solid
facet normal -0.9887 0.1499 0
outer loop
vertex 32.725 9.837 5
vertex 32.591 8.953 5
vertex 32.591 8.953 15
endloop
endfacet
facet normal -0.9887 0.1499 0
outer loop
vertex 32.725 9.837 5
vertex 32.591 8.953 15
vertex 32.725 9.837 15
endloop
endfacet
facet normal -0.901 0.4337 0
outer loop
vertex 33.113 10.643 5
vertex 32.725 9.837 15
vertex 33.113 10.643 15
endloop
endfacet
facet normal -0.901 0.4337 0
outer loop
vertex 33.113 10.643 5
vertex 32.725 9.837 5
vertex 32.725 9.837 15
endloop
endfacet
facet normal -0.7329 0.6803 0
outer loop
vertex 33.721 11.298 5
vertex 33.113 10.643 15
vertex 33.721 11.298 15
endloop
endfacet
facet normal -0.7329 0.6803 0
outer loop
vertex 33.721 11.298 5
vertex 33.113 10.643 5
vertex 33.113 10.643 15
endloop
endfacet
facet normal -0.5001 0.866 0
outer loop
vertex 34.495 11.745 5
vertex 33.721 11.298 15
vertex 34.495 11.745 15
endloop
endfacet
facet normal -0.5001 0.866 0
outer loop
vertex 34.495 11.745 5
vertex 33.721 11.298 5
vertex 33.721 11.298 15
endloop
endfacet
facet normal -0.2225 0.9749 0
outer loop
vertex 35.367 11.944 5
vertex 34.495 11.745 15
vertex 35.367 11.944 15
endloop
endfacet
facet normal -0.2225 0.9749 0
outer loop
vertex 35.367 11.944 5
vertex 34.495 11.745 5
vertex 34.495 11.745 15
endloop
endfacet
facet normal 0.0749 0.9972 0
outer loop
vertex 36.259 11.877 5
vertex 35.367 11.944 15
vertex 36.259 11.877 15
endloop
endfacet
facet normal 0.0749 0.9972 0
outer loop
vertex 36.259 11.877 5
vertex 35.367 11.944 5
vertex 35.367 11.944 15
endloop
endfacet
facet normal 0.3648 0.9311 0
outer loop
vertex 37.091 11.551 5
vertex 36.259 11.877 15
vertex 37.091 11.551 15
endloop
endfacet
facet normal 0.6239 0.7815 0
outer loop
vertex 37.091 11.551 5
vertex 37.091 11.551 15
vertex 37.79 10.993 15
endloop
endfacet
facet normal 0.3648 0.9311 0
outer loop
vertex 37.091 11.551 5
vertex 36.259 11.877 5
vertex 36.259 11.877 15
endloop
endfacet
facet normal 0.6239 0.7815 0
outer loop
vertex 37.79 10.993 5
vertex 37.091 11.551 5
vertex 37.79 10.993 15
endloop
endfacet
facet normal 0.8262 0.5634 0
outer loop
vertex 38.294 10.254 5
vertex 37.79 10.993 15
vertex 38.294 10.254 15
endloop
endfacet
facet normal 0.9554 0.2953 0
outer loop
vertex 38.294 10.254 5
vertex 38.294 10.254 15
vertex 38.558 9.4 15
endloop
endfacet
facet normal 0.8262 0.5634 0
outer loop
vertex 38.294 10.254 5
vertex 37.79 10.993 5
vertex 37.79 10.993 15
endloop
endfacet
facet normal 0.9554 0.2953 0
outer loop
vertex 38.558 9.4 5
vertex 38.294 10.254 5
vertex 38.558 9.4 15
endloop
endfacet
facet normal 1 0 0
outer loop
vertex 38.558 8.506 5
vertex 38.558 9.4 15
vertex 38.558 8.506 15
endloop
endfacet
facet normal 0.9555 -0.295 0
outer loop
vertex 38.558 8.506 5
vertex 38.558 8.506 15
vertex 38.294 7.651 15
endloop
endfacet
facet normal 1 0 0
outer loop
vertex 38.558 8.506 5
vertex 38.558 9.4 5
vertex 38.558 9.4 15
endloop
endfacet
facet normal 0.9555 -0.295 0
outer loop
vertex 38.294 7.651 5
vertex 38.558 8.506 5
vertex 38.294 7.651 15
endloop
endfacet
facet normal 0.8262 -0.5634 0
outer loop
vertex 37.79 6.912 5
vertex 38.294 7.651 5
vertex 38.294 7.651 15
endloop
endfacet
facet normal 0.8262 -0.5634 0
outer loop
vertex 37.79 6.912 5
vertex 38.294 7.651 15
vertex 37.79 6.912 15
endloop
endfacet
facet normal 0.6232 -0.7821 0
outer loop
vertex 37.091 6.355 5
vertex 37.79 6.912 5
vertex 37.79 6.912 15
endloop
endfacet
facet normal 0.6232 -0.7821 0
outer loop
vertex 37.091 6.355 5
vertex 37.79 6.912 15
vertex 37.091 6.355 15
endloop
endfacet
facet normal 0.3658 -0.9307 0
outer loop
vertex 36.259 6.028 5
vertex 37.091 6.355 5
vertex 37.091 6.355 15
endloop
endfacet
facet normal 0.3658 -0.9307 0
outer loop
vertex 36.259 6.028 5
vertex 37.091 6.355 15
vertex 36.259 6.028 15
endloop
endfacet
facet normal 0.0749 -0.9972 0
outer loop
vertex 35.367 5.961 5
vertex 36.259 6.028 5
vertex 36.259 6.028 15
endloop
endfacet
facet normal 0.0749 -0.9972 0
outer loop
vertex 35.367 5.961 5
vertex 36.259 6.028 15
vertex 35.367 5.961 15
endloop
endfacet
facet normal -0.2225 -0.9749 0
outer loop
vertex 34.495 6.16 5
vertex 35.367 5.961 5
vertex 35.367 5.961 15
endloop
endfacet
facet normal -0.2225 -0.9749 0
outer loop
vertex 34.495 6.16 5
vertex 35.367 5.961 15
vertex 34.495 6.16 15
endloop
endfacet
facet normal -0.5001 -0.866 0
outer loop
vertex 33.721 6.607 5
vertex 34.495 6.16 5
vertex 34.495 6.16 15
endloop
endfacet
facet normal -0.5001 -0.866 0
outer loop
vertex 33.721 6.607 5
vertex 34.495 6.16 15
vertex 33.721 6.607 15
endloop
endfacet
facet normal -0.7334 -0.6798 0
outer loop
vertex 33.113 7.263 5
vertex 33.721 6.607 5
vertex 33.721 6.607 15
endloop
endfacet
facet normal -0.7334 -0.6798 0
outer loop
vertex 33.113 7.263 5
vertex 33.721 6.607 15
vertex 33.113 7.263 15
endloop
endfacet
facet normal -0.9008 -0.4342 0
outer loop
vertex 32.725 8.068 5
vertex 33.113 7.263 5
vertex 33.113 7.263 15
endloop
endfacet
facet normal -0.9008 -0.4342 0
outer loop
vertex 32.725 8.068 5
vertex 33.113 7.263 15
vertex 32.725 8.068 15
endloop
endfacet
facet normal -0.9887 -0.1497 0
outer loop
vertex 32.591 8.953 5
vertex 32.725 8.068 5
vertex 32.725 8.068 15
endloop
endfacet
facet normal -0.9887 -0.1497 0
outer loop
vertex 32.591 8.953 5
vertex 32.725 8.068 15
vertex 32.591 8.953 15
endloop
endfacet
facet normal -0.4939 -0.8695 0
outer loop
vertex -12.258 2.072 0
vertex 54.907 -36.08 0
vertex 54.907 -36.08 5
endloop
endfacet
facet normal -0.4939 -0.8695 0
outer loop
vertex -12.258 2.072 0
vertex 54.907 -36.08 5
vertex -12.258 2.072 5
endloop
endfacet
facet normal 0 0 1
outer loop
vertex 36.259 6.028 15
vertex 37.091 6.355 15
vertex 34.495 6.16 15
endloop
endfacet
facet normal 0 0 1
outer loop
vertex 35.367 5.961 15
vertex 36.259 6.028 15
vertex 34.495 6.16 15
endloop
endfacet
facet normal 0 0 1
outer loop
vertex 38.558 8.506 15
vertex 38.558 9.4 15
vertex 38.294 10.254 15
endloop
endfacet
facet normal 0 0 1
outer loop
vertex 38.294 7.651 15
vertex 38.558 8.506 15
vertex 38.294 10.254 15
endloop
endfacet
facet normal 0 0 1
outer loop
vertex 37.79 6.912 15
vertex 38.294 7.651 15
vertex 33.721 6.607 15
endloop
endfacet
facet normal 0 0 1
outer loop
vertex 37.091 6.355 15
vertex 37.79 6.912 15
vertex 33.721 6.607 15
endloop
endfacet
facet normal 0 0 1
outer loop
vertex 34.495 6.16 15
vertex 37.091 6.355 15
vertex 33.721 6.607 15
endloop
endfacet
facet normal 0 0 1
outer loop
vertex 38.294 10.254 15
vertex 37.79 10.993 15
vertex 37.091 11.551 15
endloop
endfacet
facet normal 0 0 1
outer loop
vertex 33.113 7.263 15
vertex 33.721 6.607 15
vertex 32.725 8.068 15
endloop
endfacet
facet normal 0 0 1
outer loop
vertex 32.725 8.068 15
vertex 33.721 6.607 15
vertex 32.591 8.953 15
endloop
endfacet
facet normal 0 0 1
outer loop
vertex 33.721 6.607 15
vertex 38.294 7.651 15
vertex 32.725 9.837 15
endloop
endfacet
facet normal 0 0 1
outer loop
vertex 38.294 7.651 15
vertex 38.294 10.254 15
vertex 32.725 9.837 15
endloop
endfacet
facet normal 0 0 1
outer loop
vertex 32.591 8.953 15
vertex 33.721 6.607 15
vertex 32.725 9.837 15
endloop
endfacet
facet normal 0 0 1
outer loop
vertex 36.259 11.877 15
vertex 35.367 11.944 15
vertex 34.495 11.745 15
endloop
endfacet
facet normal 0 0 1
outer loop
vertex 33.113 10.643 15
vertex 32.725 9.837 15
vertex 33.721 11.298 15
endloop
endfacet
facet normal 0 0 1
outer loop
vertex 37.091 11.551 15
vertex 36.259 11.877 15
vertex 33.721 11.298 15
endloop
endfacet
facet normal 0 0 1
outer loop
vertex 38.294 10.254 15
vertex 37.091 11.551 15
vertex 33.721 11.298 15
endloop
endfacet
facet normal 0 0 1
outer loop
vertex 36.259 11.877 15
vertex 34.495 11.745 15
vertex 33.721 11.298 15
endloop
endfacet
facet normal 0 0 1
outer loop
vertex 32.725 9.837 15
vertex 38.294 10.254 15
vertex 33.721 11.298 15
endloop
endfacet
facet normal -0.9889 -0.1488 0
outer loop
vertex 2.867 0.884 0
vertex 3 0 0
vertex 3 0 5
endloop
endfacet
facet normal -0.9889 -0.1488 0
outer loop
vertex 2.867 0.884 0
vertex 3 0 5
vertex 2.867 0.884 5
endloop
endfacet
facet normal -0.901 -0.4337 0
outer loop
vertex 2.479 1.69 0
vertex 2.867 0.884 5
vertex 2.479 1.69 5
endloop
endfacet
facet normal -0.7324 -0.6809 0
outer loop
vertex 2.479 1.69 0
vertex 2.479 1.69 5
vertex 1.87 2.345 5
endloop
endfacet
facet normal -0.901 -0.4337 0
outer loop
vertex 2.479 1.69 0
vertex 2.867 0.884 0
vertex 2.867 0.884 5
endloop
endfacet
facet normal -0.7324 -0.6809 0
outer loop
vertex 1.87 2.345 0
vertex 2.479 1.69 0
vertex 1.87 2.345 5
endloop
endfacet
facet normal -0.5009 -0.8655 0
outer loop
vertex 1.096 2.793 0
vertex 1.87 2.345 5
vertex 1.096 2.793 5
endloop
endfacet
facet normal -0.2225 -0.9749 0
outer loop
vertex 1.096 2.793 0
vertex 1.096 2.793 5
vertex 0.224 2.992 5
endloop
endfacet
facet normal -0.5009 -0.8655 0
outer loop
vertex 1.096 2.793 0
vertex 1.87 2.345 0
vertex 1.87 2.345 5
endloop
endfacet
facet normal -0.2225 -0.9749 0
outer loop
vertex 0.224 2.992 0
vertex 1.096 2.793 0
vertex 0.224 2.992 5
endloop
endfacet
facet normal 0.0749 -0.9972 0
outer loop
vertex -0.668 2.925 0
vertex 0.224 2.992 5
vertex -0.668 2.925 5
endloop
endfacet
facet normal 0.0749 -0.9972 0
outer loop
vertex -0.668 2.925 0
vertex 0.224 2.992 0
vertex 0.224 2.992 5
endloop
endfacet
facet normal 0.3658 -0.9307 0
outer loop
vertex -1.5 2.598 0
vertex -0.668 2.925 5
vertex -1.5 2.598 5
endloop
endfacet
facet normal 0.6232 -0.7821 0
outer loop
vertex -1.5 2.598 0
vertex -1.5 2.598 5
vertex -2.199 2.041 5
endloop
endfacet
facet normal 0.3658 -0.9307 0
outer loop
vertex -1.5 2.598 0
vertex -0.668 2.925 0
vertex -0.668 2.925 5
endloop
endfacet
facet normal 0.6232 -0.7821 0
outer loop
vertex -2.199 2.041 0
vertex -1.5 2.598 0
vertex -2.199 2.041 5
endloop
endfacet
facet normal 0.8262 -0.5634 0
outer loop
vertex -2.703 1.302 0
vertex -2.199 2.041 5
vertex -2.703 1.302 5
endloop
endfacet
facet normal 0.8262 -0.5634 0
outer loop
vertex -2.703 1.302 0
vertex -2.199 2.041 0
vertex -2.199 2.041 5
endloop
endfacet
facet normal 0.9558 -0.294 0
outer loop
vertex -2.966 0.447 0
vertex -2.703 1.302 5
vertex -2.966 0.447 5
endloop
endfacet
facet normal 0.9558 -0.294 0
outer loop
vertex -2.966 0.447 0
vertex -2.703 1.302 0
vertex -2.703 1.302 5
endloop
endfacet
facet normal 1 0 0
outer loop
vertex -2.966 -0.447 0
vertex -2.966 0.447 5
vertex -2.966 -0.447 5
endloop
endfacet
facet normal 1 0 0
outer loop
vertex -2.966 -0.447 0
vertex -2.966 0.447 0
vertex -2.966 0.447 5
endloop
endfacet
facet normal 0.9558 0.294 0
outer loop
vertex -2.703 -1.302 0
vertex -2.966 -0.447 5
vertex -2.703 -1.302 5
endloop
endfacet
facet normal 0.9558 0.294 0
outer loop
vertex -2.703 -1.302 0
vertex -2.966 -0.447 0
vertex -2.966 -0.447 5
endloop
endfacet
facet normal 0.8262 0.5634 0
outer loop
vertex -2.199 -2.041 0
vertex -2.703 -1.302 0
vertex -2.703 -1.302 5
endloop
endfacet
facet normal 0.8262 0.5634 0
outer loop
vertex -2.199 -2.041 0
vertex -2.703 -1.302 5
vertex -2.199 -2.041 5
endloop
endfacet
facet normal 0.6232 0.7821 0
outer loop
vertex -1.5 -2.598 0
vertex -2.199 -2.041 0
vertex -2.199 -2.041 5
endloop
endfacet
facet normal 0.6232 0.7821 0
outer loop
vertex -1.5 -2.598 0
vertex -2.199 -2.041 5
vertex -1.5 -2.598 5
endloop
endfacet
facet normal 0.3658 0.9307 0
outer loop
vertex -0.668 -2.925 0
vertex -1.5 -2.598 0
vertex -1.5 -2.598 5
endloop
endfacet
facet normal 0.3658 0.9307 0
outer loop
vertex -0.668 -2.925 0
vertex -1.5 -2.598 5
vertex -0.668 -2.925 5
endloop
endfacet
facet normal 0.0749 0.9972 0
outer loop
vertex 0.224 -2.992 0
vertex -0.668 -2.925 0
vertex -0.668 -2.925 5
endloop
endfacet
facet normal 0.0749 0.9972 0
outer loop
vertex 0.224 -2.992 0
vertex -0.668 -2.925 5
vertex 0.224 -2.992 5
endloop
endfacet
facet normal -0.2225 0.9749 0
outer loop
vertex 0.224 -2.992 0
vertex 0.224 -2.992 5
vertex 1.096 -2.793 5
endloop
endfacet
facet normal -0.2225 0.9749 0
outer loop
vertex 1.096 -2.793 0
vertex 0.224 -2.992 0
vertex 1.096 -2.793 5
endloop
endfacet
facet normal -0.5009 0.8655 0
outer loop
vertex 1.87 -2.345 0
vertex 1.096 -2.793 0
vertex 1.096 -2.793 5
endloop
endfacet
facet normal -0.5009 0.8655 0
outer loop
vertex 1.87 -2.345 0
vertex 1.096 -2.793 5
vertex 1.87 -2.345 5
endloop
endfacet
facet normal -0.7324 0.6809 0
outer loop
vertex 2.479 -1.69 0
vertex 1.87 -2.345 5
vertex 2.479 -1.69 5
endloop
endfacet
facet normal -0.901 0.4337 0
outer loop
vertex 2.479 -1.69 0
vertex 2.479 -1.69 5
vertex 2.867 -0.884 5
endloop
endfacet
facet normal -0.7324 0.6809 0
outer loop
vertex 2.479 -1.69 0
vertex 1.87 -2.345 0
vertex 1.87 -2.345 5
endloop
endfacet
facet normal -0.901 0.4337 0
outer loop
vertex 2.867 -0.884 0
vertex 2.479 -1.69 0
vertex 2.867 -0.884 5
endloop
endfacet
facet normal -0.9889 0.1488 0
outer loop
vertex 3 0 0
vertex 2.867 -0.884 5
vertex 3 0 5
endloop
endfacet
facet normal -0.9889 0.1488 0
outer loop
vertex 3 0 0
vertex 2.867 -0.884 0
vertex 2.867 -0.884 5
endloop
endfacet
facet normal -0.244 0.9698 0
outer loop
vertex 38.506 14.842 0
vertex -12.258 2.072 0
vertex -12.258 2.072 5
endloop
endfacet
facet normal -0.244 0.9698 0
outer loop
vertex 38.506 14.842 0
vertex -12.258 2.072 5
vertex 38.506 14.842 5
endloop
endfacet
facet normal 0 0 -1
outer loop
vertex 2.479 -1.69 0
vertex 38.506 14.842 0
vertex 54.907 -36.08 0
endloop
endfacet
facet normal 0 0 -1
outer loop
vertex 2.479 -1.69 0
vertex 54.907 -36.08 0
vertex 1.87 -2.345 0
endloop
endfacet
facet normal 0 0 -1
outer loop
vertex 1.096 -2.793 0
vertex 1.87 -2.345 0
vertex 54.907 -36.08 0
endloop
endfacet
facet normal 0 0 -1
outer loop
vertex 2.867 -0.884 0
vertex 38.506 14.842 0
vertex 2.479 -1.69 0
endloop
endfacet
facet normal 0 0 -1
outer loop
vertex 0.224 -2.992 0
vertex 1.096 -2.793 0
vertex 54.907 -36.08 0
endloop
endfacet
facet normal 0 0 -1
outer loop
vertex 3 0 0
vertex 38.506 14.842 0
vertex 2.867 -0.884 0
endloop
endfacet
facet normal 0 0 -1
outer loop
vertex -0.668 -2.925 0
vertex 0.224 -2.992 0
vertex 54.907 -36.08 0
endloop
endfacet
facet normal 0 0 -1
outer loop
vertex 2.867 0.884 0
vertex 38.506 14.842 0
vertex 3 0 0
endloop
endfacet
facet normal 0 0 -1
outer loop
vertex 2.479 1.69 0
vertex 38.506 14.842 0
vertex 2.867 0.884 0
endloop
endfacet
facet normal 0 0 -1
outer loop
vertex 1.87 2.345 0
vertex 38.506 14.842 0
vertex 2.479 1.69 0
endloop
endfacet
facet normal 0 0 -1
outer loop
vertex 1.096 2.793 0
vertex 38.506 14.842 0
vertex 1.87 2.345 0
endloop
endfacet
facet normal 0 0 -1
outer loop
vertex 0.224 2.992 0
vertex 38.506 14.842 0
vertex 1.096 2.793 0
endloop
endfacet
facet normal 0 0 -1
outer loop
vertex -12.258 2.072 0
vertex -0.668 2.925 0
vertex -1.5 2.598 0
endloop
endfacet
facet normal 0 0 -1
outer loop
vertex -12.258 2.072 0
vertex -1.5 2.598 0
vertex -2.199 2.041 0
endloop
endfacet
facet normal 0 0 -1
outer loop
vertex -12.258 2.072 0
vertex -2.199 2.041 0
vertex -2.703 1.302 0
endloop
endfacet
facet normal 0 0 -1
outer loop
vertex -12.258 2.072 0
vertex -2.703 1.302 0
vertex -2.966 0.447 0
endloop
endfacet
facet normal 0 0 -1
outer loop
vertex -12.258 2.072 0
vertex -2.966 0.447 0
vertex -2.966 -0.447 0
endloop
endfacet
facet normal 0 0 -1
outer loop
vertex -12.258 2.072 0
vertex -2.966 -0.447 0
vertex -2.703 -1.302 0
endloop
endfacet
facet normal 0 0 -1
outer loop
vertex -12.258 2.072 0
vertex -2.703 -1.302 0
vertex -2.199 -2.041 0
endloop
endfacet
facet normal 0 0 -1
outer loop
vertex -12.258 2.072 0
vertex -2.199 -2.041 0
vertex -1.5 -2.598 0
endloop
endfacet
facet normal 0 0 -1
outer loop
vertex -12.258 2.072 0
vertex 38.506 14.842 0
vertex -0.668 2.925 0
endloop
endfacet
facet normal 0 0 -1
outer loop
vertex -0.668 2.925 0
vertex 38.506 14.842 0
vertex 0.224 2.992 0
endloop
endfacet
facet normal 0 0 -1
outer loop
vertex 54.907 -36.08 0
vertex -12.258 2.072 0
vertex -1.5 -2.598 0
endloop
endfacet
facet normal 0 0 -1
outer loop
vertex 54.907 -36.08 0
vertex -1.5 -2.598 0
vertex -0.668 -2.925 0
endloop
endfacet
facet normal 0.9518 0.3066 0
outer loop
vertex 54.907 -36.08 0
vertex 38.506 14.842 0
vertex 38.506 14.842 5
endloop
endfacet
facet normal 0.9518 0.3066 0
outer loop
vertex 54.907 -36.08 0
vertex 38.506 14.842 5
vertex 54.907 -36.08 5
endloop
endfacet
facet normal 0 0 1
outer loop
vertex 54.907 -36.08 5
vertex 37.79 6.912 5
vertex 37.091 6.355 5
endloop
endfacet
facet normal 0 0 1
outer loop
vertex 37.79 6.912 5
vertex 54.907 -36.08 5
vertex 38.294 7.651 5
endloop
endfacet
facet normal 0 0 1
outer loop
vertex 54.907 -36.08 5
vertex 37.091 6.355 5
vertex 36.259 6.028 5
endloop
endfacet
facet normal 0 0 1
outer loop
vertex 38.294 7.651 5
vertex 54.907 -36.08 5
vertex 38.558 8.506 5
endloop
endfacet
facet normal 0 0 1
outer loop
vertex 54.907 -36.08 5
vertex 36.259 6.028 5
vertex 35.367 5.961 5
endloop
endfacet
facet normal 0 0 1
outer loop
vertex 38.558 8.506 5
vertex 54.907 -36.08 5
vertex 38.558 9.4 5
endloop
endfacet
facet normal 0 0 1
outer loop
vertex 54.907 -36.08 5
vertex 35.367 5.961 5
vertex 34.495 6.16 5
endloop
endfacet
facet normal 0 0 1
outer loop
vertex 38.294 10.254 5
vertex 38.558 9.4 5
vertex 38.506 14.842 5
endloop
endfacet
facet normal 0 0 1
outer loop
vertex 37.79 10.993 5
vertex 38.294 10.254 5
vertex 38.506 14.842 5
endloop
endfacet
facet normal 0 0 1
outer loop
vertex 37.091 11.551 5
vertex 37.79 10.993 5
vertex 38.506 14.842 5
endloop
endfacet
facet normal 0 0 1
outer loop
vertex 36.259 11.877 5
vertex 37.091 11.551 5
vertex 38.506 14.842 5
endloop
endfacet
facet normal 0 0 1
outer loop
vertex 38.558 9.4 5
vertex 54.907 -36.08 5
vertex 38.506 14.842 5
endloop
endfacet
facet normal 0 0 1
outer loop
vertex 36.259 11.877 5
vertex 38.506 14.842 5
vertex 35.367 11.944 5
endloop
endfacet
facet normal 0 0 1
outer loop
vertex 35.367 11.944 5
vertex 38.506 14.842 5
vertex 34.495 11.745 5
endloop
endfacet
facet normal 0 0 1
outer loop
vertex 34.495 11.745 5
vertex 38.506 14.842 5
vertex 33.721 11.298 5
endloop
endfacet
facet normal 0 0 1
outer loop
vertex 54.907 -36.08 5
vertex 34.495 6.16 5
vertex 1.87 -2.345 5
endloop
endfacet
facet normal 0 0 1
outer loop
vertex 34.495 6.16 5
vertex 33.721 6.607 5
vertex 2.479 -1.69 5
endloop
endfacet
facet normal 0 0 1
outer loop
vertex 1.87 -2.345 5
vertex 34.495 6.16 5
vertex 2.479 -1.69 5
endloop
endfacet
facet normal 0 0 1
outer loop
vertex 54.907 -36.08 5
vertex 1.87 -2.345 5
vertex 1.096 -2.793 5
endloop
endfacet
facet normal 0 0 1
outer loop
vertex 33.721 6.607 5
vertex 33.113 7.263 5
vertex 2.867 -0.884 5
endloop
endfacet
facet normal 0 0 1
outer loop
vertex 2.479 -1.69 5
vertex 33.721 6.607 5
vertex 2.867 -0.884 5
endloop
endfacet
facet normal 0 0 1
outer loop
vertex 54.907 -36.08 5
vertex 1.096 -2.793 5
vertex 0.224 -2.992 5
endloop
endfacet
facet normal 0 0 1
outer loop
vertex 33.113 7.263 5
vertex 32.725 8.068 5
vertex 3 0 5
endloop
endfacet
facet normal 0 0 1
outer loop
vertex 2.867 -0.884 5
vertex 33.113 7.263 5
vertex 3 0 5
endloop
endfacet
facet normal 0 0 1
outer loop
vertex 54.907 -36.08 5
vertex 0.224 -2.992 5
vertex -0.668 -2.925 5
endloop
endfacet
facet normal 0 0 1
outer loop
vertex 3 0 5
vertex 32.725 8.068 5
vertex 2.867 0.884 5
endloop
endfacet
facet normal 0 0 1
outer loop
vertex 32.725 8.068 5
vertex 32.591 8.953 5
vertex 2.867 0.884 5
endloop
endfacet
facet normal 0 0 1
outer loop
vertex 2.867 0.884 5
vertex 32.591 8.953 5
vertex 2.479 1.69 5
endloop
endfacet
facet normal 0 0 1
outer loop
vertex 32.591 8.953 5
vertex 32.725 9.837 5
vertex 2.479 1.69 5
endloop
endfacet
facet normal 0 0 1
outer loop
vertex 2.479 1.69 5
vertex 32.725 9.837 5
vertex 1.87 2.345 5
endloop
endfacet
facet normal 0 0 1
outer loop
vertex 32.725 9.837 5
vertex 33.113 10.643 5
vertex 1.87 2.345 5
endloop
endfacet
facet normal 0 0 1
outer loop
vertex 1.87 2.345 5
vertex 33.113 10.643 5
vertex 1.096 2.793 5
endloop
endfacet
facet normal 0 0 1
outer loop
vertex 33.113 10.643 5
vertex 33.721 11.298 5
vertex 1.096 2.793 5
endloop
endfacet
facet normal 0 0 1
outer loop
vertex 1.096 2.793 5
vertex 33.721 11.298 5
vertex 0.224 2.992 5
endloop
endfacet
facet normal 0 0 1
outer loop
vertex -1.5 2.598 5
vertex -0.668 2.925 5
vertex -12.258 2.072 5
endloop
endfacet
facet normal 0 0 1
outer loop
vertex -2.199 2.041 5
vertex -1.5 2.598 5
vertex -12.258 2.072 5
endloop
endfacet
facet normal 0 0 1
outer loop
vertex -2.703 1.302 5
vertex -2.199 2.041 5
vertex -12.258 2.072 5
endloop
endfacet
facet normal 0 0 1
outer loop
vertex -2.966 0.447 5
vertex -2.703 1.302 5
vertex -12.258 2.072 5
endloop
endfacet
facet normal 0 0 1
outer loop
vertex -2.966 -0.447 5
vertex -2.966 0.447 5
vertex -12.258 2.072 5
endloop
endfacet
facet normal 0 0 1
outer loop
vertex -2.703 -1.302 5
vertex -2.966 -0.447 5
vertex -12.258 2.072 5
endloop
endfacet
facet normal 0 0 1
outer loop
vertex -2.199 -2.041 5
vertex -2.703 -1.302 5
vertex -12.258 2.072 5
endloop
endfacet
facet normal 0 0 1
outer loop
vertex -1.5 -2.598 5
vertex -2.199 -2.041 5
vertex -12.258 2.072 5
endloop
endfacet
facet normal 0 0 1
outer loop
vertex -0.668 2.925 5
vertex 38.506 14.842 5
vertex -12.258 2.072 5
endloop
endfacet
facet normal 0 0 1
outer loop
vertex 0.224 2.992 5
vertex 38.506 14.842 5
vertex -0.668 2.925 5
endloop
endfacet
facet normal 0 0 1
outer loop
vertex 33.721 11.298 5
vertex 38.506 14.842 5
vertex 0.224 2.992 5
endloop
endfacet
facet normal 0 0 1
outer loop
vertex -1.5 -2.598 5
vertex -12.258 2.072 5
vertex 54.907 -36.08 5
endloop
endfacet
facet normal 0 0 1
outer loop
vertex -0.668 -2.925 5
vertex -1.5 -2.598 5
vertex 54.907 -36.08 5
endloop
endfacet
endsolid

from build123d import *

# Parameters (mm, degrees)
SKETCH1_R           = 3
BOSS_EXTRUDE1_DEPTH = 5
SKETCH2_R           = 3
BOSS_EXTRUDE2_DEPTH = 15


with BuildPart() as part:
    # Sketch1 → Boss-Extrude1 (new body)
    with BuildSketch(Plane.XY):
        Polygon((-12.258432753, 2.072266385), (38.505942563, 14.841548426), (54.906660914, -36.079753149), align=None)
        Circle(SKETCH1_R, mode=Mode.SUBTRACT)
        with Locations((35.591293936, 8.952641841)):
            Circle(SKETCH1_R, mode=Mode.SUBTRACT)
    extrude(amount=BOSS_EXTRUDE1_DEPTH)

    # Sketch2 → Boss-Extrude2 (add)
    with BuildSketch(Plane(origin=(0, 0, 0), x_dir=(-1, 0, 0), z_dir=(0, 0, -1))):
        with Locations((-35.591293936, 8.952641841)):
            Circle(SKETCH2_R)
    extrude(amount=-BOSS_EXTRUDE2_DEPTH)


solid = part.part
